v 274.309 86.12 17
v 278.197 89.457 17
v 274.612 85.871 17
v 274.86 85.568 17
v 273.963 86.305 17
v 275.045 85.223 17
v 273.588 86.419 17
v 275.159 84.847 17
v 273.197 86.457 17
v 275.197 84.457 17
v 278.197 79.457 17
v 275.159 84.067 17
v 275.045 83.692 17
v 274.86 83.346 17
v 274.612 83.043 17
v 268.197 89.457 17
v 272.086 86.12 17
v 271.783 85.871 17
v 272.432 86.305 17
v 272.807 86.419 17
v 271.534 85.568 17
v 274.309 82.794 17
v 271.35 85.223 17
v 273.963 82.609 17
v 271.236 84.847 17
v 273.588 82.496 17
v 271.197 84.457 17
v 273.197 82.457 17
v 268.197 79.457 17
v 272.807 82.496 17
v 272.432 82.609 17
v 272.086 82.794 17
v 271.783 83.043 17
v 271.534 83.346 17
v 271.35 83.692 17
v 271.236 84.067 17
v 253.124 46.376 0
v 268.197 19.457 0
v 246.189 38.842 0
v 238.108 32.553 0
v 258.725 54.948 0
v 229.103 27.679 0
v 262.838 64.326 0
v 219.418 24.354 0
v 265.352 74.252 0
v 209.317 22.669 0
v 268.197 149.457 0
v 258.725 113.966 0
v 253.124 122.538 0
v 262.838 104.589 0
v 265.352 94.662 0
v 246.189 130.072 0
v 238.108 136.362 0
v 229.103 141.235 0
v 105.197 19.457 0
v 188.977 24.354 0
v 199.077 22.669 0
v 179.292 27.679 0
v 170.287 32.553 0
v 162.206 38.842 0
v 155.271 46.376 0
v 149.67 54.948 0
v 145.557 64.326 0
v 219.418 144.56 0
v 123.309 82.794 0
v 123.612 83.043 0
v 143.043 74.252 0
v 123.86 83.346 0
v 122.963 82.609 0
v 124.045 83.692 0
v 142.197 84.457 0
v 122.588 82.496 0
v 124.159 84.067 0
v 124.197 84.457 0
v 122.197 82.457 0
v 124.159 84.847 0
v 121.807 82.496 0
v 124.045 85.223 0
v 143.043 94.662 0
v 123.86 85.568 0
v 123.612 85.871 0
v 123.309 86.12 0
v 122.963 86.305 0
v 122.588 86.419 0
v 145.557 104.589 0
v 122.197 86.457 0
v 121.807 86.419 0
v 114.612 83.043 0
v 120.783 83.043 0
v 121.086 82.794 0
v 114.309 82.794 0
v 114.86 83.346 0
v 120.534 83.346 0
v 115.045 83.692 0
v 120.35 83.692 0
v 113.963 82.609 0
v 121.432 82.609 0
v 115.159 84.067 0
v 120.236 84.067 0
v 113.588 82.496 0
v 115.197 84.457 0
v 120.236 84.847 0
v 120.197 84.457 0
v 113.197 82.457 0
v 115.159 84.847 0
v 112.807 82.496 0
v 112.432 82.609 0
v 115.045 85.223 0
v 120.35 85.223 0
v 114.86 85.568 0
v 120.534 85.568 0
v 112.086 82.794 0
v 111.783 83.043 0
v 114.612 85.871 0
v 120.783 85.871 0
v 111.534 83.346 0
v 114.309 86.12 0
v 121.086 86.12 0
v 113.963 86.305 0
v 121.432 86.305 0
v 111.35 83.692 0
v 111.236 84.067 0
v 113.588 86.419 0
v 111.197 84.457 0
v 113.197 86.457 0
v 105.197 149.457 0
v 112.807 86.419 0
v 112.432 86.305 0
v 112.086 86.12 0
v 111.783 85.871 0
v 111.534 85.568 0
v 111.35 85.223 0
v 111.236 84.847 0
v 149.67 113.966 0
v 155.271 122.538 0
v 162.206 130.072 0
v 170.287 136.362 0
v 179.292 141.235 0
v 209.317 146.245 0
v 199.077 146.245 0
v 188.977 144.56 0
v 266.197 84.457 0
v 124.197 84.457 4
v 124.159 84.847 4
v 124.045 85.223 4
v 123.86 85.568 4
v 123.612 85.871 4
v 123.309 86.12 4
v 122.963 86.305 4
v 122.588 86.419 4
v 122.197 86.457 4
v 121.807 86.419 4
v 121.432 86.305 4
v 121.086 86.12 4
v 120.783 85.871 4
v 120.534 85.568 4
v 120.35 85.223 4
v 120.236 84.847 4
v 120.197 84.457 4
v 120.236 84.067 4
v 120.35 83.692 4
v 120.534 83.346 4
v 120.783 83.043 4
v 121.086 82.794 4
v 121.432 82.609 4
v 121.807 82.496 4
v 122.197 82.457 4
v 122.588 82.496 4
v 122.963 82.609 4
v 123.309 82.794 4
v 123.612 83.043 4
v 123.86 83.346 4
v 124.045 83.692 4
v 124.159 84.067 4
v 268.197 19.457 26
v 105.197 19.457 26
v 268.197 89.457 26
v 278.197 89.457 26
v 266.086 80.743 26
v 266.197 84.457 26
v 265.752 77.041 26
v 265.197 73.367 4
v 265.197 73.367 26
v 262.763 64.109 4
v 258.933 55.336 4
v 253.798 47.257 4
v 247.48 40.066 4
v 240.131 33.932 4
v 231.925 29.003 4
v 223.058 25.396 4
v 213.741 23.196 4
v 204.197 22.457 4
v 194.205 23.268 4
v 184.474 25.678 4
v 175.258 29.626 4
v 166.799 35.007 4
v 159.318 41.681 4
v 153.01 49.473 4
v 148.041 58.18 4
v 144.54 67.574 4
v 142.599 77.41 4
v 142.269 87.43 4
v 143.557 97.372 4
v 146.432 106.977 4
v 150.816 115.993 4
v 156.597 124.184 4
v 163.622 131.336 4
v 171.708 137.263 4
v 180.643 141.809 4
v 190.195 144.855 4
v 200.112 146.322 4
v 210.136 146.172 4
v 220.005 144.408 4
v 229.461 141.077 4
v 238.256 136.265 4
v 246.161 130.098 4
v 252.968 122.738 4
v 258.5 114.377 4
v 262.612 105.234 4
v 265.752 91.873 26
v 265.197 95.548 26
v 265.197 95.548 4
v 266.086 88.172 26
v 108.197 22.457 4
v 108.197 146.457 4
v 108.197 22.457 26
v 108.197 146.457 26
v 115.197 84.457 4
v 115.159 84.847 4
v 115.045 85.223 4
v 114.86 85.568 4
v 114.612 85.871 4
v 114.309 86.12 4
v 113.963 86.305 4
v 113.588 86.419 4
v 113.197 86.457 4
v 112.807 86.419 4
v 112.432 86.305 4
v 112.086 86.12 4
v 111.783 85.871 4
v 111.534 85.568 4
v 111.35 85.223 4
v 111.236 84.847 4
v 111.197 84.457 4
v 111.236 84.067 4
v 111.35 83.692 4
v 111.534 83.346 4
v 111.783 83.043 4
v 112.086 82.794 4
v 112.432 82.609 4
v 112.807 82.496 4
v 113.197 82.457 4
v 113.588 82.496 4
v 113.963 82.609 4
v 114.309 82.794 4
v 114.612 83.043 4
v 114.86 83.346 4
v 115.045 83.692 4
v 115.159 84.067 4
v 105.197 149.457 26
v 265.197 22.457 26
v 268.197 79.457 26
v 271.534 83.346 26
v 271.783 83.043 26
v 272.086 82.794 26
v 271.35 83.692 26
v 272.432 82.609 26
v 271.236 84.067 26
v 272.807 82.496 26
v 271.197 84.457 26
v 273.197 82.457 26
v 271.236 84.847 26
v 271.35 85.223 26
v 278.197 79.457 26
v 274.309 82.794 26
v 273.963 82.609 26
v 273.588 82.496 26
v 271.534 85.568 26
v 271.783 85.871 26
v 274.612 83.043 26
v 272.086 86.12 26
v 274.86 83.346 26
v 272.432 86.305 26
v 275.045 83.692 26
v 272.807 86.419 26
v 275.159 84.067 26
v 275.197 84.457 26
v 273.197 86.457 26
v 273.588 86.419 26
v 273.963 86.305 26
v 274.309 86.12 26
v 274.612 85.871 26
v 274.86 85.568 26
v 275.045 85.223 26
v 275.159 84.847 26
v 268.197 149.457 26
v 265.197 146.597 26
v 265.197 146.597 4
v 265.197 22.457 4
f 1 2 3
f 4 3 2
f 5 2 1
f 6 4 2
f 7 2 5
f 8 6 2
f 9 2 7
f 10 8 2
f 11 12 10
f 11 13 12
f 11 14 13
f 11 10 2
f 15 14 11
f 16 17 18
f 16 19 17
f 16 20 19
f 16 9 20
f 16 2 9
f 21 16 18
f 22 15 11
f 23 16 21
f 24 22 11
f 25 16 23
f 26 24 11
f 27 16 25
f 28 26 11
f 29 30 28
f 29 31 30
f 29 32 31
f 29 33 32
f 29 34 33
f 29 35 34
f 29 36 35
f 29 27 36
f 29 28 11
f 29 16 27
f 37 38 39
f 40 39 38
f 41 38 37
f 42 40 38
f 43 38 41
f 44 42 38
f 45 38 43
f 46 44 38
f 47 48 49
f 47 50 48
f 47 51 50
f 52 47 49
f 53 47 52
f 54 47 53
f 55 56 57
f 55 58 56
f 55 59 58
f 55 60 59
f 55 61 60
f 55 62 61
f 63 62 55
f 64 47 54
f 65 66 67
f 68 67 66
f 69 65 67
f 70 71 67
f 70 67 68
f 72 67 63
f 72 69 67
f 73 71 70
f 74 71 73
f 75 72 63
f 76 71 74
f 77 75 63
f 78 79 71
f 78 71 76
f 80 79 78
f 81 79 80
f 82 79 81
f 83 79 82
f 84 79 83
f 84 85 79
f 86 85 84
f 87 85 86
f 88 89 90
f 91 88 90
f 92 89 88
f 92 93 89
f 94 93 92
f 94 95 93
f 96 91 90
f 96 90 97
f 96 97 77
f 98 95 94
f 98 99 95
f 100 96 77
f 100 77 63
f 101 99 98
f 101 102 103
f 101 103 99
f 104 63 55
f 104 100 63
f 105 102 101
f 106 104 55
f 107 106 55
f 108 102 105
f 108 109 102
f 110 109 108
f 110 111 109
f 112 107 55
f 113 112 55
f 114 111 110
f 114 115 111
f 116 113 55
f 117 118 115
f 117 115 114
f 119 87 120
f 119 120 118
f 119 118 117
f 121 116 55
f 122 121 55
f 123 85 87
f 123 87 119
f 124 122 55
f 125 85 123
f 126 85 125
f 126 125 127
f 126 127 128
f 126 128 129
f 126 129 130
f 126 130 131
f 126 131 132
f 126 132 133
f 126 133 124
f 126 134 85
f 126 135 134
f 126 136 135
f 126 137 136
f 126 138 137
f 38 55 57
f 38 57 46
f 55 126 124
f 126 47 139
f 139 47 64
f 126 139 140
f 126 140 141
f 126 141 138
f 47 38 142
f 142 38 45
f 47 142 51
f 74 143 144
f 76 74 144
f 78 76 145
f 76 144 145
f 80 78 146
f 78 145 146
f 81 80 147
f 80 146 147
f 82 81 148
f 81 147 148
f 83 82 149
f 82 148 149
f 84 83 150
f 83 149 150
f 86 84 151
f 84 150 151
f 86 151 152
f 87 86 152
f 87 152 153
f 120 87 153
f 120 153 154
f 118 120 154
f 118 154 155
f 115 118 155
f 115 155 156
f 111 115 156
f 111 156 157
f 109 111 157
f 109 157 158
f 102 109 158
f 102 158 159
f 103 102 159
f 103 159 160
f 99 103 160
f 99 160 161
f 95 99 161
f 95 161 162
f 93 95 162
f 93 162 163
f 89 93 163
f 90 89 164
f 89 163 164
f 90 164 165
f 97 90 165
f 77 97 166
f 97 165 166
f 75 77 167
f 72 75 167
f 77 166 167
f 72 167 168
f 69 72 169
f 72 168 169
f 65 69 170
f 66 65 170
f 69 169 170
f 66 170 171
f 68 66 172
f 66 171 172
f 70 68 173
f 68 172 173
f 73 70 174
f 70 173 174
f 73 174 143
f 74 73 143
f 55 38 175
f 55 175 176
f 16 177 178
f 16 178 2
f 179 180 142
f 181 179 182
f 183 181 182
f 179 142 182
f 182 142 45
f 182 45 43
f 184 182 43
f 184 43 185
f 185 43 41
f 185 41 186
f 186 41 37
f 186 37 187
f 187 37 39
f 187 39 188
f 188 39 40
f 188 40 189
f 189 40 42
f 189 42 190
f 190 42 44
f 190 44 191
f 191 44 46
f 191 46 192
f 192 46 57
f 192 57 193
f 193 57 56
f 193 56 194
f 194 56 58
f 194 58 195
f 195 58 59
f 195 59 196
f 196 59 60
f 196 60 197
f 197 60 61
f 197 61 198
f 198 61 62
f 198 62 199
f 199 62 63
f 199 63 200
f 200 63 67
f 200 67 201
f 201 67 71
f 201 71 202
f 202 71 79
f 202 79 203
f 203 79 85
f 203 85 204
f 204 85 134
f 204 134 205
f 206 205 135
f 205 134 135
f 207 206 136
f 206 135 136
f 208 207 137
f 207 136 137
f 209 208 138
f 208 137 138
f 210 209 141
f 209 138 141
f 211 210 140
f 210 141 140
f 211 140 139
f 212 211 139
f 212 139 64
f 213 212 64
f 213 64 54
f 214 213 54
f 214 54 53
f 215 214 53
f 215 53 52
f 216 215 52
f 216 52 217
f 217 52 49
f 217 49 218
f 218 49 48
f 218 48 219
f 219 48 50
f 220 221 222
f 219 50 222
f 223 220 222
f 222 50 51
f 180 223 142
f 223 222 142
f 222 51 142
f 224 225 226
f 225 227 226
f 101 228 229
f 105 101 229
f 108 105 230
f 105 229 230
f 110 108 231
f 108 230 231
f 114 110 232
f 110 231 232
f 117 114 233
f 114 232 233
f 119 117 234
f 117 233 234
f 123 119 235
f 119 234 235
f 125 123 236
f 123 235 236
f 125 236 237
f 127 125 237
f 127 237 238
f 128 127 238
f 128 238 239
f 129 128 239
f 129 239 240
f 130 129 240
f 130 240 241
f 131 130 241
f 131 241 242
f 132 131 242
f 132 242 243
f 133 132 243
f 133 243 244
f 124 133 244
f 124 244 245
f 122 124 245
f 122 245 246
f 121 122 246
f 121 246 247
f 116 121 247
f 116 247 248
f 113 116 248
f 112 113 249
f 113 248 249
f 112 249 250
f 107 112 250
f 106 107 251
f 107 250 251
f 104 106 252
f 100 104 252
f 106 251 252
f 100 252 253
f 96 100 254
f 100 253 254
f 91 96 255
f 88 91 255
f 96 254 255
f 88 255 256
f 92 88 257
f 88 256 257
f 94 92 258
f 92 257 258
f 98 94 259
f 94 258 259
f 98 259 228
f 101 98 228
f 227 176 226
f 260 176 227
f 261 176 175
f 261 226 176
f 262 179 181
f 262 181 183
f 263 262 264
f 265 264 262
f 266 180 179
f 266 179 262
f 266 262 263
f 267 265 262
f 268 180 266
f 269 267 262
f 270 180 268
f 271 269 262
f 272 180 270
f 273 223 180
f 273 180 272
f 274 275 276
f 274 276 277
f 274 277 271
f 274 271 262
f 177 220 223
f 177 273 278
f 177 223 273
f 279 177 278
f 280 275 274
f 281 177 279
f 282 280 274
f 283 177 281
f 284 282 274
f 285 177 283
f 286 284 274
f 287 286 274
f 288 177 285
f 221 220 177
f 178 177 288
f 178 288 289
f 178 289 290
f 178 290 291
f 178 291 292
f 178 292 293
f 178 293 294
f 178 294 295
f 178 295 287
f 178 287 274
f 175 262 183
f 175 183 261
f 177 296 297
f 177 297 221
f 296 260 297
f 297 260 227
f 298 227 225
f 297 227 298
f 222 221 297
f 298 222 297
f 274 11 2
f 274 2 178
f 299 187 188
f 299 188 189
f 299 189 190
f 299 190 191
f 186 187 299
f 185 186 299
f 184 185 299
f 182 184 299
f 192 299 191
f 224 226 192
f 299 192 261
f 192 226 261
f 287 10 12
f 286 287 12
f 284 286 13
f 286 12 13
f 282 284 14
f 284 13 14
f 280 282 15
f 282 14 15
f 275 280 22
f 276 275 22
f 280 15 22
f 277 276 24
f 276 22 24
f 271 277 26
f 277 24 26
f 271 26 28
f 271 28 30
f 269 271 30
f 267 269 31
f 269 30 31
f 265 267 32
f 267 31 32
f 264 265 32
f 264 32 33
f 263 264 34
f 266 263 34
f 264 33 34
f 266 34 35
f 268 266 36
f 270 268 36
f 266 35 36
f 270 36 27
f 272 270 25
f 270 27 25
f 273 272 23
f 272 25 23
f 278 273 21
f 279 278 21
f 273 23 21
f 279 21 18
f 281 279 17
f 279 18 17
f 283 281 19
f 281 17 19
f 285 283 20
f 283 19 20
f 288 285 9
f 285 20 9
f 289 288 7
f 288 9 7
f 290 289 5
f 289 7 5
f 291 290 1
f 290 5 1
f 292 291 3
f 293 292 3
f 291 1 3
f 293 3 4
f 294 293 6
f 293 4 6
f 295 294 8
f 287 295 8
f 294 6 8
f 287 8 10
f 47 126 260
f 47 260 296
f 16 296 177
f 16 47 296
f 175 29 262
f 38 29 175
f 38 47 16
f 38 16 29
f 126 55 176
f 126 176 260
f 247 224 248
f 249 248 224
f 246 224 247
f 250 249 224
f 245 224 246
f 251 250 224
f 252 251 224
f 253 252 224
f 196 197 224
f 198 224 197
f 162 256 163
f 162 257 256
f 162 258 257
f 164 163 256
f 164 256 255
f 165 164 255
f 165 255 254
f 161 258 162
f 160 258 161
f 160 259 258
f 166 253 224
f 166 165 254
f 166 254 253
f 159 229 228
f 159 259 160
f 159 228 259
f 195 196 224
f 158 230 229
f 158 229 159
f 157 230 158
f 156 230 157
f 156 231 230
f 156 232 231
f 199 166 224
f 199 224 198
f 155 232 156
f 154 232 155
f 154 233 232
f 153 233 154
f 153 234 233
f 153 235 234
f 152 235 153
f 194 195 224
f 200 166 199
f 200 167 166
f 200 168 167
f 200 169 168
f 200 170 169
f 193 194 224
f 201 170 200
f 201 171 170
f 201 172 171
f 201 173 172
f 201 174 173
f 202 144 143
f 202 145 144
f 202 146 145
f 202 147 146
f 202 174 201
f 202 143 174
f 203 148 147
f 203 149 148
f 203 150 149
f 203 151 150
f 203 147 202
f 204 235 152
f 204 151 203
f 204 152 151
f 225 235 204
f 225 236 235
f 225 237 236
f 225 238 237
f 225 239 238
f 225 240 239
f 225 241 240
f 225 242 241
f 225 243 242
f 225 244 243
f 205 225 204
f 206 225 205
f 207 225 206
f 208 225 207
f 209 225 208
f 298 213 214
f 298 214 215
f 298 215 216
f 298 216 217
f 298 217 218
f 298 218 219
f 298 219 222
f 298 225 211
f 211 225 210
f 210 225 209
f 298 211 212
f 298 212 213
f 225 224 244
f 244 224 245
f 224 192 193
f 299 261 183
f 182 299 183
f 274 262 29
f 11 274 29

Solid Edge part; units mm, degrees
sketch "Sketch1" plane through (0, 0, 0) normal (0, 0, 1) x (1, 0, 0)
  line L0 (105.1974, 149.4572) -> (268.1974, 149.4572)
  line L1 (268.1974, 149.4572) -> (268.1974, 19.4572)
  line L2 (268.1974, 19.4572) -> (105.1974, 19.4572)
  line L3 (105.1974, 19.4572) -> (105.1974, 149.4572)
  dimension "D1" = 163
  dimension "D2" = 130
extrude "Protrusion1" add sketch "Sketch1" along normal blind 27
sketch "Sketch2" plane through (170.1974, 84.4572, 27) normal (0, 0, 1) x (1, 0, 0)
  line L0 (-62, 62) -> (-62, -62)
  line L1 (-62, -62) -> (95, -62)
  line L2 (95, -62) -> (95, 62.14)
  line L3 (-62, 62) -> (95, 62.14)
  dimension "D1" = 3
  dimension "D2" = 3
  dimension "D3" = 3
  dimension "D4" = 3
  dimension "D5" = 3
extrude "ExtrudedCutout_1" cut sketch "Sketch2" against normal blind 23
sketch "Sketch3" plane through (170.1974, 84.5136, 4) normal (0, 0, 1) x (1, 0, 0)
  circle A0 centre (-57, -0.0564) radius 2
  circle A1 centre (-48, -0.0564) radius 2
  dimension "D1" = 4
  dimension "D2" = 5
  dimension "D3" = 4
  dimension "D4" = 9
extrude "Cutout1" cut sketch "Sketch3" against normal through all
sketch "Sketch4" plane through (186.6974, 84.4572, 0) normal (0, 0, -1) x (1, 0, 0)
  circle A0 centre (17.5, 0) radius 62
  dimension "D1" = 124
  dimension "D2" = 99
extrude "Cutout2" cut sketch "Sketch4" against normal through all
sketch "Sketch5" plane through (268.1974, 84.4572, 13.5) normal (1, 0, 0) x (0, 0, 1)
  line L0 (13.5, 0) -> (13.5, 5)
  line L1 (13.5, 5) -> (3.5, 5)
  line L2 (3.5, -5) -> (3.5, 5)
  line L3 (13.5, -5) -> (3.5, -5)
  line L4 (13.5, 0) -> (13.5, -5)
  dimension "D1" = 5
  dimension "D2" = 5
  dimension "D3" = 10
  dimension "D4" = 10
extrude "ExtrudedProtrusion_7" add sketch "Sketch5" along normal blind 10
sketch "Sketch6" plane through (273.1974, 84.4572, 17) normal (0, 0, -1) x (1, 0, 0)
  circle A0 centre (0, 0) radius 2
  dimension "D1" = 4
  dimension "D2" = 5
  dimension "D3" = 5
extrude "Cutout3" cut sketch "Sketch6" against normal through all
sketch "Sketch7" plane through (191.6974, 84.4572, 27) normal (0, 0, 1) x (1, 0, 0)
  line L0 (-122.0031, 91.8624) -> (-122.0031, -126.2255)
  line L1 (-122.0031, -126.2255) -> (122.899, -118.4792)
  line L2 (122.899, -118.4792) -> (110.9816, 91.8624)
  line L3 (110.9816, 91.8624) -> (-122.0031, 91.8624)
extrude "ExtrudedCutout_10" cut sketch "Sketch7" against normal blind 1
